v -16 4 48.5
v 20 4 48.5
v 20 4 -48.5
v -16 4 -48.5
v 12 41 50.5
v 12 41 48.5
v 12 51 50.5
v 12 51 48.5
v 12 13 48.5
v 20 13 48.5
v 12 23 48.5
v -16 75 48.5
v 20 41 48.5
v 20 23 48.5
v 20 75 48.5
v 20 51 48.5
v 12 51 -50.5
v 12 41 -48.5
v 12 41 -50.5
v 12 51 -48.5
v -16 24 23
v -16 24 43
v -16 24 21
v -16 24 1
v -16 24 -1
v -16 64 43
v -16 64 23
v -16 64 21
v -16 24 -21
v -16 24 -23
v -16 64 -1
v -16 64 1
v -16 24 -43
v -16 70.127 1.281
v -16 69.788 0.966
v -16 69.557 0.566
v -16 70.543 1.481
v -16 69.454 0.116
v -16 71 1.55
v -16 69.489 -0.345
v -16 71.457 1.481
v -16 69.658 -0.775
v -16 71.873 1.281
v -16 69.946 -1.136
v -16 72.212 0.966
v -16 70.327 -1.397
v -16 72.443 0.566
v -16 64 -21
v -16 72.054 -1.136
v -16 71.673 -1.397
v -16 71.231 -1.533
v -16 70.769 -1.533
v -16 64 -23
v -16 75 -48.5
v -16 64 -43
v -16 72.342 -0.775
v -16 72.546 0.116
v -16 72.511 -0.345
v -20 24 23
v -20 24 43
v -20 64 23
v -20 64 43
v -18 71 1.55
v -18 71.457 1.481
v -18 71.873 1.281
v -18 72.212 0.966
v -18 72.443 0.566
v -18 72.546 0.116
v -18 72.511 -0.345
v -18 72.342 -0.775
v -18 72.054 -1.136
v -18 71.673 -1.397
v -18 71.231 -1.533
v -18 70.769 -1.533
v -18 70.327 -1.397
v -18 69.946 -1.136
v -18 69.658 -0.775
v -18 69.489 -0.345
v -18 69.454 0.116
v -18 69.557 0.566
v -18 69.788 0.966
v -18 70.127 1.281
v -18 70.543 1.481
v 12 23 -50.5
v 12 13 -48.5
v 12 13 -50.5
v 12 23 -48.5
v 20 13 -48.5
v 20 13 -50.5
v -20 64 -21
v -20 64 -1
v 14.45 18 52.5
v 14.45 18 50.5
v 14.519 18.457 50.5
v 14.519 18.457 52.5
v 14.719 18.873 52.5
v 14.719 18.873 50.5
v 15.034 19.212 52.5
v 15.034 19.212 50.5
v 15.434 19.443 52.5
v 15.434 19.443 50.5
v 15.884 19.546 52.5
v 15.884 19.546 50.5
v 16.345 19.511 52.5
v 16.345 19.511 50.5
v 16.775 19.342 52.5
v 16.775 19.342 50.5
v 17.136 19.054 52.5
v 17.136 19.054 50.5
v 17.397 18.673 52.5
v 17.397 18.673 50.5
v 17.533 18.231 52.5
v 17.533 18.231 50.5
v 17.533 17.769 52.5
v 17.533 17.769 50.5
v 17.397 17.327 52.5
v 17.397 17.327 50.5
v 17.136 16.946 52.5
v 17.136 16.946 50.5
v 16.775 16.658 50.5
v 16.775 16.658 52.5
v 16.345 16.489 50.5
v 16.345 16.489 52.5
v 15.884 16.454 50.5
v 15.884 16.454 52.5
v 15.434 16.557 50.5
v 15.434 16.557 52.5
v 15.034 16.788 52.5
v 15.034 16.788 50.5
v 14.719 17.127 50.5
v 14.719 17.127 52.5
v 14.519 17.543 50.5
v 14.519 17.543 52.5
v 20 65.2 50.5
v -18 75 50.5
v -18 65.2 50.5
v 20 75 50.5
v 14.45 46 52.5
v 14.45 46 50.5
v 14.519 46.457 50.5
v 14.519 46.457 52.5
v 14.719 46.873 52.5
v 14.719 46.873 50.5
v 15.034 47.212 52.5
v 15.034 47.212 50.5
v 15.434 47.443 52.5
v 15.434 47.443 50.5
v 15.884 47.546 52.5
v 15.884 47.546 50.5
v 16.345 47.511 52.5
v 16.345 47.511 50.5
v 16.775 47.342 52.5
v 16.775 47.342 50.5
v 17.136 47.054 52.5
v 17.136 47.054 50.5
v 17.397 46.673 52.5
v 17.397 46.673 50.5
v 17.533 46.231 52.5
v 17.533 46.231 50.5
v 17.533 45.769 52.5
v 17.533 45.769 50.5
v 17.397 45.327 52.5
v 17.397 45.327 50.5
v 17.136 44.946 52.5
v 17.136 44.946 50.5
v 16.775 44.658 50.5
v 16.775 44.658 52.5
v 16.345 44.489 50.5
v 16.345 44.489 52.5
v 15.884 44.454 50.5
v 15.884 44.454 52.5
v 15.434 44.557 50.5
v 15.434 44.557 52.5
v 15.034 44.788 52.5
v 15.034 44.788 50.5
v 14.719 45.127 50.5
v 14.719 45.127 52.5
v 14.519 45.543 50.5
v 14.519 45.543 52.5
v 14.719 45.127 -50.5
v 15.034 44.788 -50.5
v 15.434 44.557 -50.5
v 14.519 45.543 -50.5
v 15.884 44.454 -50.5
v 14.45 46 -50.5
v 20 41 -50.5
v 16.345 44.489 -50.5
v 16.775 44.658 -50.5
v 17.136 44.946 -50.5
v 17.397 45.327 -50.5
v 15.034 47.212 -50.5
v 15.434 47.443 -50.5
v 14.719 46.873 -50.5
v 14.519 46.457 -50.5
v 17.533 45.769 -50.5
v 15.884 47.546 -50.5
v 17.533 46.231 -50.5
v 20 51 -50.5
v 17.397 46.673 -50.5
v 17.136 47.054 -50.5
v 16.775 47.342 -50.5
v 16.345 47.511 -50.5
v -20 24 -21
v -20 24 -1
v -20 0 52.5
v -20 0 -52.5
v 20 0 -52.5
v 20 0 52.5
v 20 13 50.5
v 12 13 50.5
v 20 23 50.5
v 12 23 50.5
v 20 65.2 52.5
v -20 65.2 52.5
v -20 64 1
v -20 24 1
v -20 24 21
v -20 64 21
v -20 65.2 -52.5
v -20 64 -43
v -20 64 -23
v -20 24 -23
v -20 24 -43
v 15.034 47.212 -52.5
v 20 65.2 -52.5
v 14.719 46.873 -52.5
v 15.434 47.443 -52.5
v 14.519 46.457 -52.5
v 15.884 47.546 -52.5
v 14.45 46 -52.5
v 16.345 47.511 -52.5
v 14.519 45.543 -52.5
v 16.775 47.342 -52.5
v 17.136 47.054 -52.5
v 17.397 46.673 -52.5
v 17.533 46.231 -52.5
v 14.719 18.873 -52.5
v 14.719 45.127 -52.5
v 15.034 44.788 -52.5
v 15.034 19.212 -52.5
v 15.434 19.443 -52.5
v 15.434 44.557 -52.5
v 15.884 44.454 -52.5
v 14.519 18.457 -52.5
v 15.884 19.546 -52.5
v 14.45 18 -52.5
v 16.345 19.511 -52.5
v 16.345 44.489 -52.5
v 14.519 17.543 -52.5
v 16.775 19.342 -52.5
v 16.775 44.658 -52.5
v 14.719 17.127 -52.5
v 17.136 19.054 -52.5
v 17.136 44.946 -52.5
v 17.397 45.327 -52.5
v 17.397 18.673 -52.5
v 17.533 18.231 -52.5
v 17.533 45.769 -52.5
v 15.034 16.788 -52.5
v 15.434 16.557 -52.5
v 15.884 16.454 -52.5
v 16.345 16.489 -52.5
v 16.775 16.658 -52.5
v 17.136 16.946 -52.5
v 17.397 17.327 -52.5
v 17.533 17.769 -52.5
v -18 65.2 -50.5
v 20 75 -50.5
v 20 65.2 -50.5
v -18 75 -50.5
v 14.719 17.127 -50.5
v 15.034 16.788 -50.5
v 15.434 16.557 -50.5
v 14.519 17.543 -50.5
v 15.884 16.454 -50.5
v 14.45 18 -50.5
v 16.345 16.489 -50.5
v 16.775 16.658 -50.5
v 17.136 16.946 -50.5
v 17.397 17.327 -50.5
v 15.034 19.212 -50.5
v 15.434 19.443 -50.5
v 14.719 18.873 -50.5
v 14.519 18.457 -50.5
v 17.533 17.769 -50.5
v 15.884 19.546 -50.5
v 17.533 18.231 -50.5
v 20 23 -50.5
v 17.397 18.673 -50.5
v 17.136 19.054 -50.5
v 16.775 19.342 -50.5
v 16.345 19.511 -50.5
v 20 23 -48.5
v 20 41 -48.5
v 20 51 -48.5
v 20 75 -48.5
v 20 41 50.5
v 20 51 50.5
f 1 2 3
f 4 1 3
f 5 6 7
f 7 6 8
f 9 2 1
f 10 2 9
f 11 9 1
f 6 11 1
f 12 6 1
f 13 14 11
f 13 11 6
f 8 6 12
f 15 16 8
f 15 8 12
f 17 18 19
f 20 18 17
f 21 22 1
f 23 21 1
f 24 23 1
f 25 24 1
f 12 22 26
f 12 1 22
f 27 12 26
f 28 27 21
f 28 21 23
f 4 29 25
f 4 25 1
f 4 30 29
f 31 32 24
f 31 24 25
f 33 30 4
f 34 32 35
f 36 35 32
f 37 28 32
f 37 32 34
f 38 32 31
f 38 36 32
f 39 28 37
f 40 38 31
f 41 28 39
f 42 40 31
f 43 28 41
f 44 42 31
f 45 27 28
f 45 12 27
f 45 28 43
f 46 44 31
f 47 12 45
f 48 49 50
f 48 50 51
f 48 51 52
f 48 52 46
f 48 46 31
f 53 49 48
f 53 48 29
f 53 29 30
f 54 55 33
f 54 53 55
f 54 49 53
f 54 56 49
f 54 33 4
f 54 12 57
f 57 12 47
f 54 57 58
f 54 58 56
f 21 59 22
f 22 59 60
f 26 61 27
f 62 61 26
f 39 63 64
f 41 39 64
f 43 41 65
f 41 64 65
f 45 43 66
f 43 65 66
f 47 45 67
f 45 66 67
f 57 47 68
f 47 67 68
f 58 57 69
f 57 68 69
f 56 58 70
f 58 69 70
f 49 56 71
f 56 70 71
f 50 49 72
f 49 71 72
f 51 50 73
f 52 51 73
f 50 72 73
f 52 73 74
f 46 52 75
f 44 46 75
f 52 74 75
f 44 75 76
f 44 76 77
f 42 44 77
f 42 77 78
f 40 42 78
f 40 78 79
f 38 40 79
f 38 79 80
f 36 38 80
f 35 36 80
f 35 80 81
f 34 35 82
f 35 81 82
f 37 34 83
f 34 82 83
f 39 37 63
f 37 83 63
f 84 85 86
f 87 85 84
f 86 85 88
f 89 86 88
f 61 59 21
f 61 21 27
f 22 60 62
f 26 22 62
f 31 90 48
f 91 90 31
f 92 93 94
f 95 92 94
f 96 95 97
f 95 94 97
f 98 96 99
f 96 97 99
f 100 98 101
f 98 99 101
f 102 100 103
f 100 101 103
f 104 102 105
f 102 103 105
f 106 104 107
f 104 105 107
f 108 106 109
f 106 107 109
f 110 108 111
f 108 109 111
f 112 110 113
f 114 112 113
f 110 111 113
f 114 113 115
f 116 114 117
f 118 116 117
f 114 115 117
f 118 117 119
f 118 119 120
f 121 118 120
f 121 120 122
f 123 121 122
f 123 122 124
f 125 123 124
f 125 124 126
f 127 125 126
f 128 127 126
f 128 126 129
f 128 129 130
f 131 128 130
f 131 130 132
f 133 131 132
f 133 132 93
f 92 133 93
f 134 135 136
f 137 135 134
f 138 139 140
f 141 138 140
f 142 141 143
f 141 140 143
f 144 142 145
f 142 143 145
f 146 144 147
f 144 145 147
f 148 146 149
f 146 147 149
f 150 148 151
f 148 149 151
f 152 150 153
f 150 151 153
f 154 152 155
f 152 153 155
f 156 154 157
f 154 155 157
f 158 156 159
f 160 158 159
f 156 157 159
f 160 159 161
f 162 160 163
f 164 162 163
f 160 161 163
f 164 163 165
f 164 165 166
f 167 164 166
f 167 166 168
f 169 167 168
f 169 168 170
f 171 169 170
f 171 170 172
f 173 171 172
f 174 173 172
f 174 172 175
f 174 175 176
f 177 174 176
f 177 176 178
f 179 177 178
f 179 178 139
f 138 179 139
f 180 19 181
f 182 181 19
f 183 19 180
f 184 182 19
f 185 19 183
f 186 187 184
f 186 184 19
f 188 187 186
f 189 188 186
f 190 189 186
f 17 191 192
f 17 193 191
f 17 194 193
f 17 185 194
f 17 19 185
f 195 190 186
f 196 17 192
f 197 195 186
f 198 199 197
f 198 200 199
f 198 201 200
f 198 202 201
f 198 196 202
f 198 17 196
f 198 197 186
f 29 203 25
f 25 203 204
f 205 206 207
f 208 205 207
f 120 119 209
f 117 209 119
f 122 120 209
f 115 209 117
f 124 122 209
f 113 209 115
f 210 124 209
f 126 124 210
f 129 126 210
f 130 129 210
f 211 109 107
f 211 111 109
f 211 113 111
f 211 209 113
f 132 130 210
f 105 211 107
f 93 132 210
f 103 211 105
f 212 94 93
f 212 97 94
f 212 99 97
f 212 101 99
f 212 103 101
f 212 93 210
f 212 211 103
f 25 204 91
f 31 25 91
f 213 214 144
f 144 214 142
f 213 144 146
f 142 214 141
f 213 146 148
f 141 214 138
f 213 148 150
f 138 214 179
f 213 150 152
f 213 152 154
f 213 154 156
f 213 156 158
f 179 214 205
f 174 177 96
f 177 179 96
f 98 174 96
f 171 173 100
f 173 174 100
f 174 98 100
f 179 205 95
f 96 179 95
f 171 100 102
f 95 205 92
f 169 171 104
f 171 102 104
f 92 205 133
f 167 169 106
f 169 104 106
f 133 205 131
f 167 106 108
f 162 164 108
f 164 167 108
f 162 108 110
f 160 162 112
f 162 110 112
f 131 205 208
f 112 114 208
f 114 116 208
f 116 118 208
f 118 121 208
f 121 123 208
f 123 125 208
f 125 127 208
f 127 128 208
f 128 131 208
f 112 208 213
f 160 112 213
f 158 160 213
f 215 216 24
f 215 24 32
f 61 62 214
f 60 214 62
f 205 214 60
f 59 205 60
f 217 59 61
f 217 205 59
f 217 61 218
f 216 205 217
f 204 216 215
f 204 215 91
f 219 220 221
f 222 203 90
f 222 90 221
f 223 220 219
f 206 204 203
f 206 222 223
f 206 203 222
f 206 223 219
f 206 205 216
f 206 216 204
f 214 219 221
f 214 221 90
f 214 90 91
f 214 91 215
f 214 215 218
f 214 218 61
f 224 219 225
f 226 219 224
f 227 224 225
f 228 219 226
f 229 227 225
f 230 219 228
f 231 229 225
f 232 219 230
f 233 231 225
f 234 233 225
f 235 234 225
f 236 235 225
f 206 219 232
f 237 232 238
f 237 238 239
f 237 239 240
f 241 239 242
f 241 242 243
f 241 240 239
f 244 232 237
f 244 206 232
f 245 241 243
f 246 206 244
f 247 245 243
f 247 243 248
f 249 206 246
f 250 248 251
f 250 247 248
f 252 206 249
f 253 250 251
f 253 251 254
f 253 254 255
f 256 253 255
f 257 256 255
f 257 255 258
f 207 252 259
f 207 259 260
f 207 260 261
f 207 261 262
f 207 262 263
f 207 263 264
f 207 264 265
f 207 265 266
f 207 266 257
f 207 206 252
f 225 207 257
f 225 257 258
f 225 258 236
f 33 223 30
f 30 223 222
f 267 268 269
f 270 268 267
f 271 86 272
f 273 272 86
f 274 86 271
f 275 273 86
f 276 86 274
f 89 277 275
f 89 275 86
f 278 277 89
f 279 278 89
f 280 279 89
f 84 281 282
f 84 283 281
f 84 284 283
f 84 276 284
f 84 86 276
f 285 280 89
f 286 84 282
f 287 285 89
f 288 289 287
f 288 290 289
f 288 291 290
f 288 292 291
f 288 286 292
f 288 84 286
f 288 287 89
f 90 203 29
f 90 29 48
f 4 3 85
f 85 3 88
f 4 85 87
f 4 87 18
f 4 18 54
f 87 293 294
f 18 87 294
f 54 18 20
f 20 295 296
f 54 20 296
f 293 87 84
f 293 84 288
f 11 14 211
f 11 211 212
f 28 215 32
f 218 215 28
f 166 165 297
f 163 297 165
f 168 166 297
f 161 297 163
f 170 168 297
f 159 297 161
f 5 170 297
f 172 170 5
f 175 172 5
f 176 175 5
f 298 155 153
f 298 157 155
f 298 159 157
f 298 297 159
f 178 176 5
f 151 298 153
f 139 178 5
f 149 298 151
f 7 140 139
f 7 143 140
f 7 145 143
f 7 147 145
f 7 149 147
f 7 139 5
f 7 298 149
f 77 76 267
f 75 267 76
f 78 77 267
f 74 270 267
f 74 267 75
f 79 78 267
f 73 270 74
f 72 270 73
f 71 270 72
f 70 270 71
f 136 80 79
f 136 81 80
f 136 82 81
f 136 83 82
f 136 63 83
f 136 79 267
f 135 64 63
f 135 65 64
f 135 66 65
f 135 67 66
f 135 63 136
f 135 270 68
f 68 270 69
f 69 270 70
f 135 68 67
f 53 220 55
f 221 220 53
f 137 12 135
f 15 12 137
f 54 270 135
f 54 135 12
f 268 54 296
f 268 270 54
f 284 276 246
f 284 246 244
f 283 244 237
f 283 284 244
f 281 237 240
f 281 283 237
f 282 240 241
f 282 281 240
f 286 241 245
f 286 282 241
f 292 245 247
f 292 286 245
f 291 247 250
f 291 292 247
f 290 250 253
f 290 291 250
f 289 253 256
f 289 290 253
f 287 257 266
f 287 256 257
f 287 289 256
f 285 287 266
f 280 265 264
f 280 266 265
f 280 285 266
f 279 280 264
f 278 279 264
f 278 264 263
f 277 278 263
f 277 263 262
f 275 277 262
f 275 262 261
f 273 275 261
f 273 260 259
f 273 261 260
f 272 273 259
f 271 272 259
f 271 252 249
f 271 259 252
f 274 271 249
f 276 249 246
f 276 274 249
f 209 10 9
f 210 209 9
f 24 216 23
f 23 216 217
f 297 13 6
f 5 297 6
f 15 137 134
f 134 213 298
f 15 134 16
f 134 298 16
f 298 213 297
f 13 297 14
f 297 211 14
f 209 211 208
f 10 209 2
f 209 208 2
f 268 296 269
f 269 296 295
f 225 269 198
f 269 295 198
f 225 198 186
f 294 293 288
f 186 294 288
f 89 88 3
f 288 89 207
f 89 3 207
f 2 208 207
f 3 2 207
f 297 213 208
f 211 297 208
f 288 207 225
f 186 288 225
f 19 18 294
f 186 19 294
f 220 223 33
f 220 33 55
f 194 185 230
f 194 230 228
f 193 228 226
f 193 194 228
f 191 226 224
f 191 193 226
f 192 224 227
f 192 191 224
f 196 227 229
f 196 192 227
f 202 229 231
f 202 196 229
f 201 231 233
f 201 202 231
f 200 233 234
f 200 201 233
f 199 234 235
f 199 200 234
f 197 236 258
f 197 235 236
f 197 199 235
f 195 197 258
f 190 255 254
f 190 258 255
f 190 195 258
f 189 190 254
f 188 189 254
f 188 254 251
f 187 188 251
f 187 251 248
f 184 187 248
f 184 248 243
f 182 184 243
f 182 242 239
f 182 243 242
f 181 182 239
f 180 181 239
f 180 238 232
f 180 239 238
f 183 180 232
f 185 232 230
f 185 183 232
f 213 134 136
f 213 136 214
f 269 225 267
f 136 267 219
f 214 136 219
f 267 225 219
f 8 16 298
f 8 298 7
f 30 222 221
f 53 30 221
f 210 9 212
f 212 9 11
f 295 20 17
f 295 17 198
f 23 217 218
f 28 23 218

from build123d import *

# Parameters (mm, degrees)
SKETCH1_W               = 40
SKETCH1_H               = 105
BOSS_EXTRUDE3_DEPTH     = 75
SKETCH4_W               = 97
SKETCH4_H               = 71
CUT_EXTRUDE2_DEPTH      = 36
SKETCH5_W               = 40
SKETCH5_H               = 9.8
CUT_EXTRUDE3_DEPTH      = 2
SKETCH6_W               = 40
SKETCH6_H               = 9.8
CUT_EXTRUDE4_DEPTH      = 2
SKETCH7_W               = 101
SKETCH7_H               = 9.8
CUT_EXTRUDE5_DEPTH      = 2
SKETCH8_R               = 1.55
CUT_EXTRUDE6_DEPTH      = 102
CUT_EXTRUDE6_DEPTH_BACK = 5
SKETCH9_W               = 8
SKETCH9_H               = 10
CUT_EXTRUDE7_DEPTH      = 2
SKETCH10_R              = 1.55
CUT_EXTRUDE8_DEPTH      = 2
SKETCH11_W              = 8
SKETCH11_H              = 10
CUT_EXTRUDE9_DEPTH      = 2
CUT_EXTRUDE10_REACH     = 42
SKETCH12_W              = 20
SKETCH12_H              = 40


with BuildPart() as part:
    # Sketch1 → Boss-Extrude3 (new body)
    with BuildSketch(Plane(origin=(0, 0, 0), x_dir=(1, 0, 0), z_dir=(0, 1, 0))):
        Rectangle(SKETCH1_W, SKETCH1_H)
    extrude(amount=BOSS_EXTRUDE3_DEPTH)

    # Sketch4 → Cut-Extrude2 (cut)
    with BuildSketch(Plane(origin=(20, 0, 0), x_dir=(0, 0, -1), z_dir=(1, 0, 0))):
        with Locations((0, 39.5)):
            Rectangle(SKETCH4_W, SKETCH4_H)
    extrude(amount=-CUT_EXTRUDE2_DEPTH, mode=Mode.SUBTRACT)

    # Sketch5 → Cut-Extrude3 (cut)
    with BuildSketch(Plane.XY.offset(52.5)):
        with Locations((0, 70.1)):
            Rectangle(SKETCH5_W, SKETCH5_H)
    extrude(amount=-CUT_EXTRUDE3_DEPTH, mode=Mode.SUBTRACT)

    # Sketch6 → Cut-Extrude4 (cut)
    with BuildSketch(Plane(origin=(0, 0, -52.5), x_dir=(-1, 0, 0), z_dir=(0, 0, -1))):
        with Locations((0, 70.1)):
            Rectangle(SKETCH6_W, SKETCH6_H)
    extrude(amount=-CUT_EXTRUDE4_DEPTH, mode=Mode.SUBTRACT)

    # Sketch7 → Cut-Extrude5 (cut)
    with BuildSketch(Plane.ZY.offset(20)):
        with Locations((0, 70.1)):
            Rectangle(SKETCH7_W, SKETCH7_H)
    extrude(amount=-CUT_EXTRUDE5_DEPTH, mode=Mode.SUBTRACT)

    # Sketch8 → Cut-Extrude6 (cut, two sides)
    with BuildSketch(Plane(origin=(0, 0, 48.5), x_dir=(-1, 0, 0), z_dir=(0, 0, -1))) as cut_extrude6_sk:
        with Locations((-16, 18)):
            Circle(SKETCH8_R)
        with Locations((-16, 46)):
            Circle(SKETCH8_R)
    extrude(amount=CUT_EXTRUDE6_DEPTH, mode=Mode.SUBTRACT)
    extrude(cut_extrude6_sk.sketch, amount=-CUT_EXTRUDE6_DEPTH_BACK, mode=Mode.SUBTRACT)

    # Sketch9 → Cut-Extrude7 (cut)
    with BuildSketch(Plane(origin=(0, 0, 48.5), x_dir=(-1, 0, 0), z_dir=(0, 0, -1))):
        with Locations((-16, 18)):
            Rectangle(SKETCH9_W, SKETCH9_H)
        with Locations((-16, 46)):
            Rectangle(SKETCH9_W, SKETCH9_H)
    extrude(amount=-CUT_EXTRUDE7_DEPTH, mode=Mode.SUBTRACT)

    # Sketch10 → Cut-Extrude8 (cut)
    with BuildSketch(Plane.ZY.offset(18)):
        with Locations((0, 71)):
            Circle(SKETCH10_R)
    extrude(amount=-CUT_EXTRUDE8_DEPTH, mode=Mode.SUBTRACT)

    # Sketch11 → Cut-Extrude9 (cut)
    with BuildSketch(Plane.XY.offset(-48.5)):
        with Locations((16, 46)):
            Rectangle(SKETCH11_W, SKETCH11_H)
        with Locations((16, 18)):
            Rectangle(SKETCH11_W, SKETCH11_H)
    extrude(amount=-CUT_EXTRUDE9_DEPTH, mode=Mode.SUBTRACT)

    # Sketch12 → Cut-Extrude10 (cut, up to next)
    with BuildSketch(Plane.ZY.offset(20), mode=Mode.PRIVATE) as cut_extrude10_sk1:
        with Locations((-33, 44)):
            Rectangle(SKETCH12_W, SKETCH12_H)
    cut_extrude10_tool1 = extrude(cut_extrude10_sk1.sketch, amount=-CUT_EXTRUDE10_REACH, mode=Mode.PRIVATE) & part.part
    add(cut_extrude10_tool1.solids().sort_by_distance((-20, 44, -33))[0], mode=Mode.SUBTRACT)
    # Sketch12 → Cut-Extrude10 (cut, up to next)
    with BuildSketch(Plane.ZY.offset(20), mode=Mode.PRIVATE) as cut_extrude10_sk2:
        with Locations((-11, 44)):
            Rectangle(SKETCH12_W, SKETCH12_H)
    cut_extrude10_tool2 = extrude(cut_extrude10_sk2.sketch, amount=-CUT_EXTRUDE10_REACH, mode=Mode.PRIVATE) & part.part
    add(cut_extrude10_tool2.solids().sort_by_distance((-20, 44, -11))[0], mode=Mode.SUBTRACT)
    # Sketch12 → Cut-Extrude10 (cut, up to next)
    with BuildSketch(Plane.ZY.offset(20), mode=Mode.PRIVATE) as cut_extrude10_sk3:
        with Locations((11, 44)):
            Rectangle(SKETCH12_W, SKETCH12_H)
    cut_extrude10_tool3 = extrude(cut_extrude10_sk3.sketch, amount=-CUT_EXTRUDE10_REACH, mode=Mode.PRIVATE) & part.part
    add(cut_extrude10_tool3.solids().sort_by_distance((-20, 44, 11))[0], mode=Mode.SUBTRACT)
    # Sketch12 → Cut-Extrude10 (cut, up to next)
    with BuildSketch(Plane.ZY.offset(20), mode=Mode.PRIVATE) as cut_extrude10_sk4:
        with Locations((33, 44)):
            Rectangle(SKETCH12_W, SKETCH12_H)
    cut_extrude10_tool4 = extrude(cut_extrude10_sk4.sketch, amount=-CUT_EXTRUDE10_REACH, mode=Mode.PRIVATE) & part.part
    add(cut_extrude10_tool4.solids().sort_by_distance((-20, 44, 33))[0], mode=Mode.SUBTRACT)


solid = part.part
